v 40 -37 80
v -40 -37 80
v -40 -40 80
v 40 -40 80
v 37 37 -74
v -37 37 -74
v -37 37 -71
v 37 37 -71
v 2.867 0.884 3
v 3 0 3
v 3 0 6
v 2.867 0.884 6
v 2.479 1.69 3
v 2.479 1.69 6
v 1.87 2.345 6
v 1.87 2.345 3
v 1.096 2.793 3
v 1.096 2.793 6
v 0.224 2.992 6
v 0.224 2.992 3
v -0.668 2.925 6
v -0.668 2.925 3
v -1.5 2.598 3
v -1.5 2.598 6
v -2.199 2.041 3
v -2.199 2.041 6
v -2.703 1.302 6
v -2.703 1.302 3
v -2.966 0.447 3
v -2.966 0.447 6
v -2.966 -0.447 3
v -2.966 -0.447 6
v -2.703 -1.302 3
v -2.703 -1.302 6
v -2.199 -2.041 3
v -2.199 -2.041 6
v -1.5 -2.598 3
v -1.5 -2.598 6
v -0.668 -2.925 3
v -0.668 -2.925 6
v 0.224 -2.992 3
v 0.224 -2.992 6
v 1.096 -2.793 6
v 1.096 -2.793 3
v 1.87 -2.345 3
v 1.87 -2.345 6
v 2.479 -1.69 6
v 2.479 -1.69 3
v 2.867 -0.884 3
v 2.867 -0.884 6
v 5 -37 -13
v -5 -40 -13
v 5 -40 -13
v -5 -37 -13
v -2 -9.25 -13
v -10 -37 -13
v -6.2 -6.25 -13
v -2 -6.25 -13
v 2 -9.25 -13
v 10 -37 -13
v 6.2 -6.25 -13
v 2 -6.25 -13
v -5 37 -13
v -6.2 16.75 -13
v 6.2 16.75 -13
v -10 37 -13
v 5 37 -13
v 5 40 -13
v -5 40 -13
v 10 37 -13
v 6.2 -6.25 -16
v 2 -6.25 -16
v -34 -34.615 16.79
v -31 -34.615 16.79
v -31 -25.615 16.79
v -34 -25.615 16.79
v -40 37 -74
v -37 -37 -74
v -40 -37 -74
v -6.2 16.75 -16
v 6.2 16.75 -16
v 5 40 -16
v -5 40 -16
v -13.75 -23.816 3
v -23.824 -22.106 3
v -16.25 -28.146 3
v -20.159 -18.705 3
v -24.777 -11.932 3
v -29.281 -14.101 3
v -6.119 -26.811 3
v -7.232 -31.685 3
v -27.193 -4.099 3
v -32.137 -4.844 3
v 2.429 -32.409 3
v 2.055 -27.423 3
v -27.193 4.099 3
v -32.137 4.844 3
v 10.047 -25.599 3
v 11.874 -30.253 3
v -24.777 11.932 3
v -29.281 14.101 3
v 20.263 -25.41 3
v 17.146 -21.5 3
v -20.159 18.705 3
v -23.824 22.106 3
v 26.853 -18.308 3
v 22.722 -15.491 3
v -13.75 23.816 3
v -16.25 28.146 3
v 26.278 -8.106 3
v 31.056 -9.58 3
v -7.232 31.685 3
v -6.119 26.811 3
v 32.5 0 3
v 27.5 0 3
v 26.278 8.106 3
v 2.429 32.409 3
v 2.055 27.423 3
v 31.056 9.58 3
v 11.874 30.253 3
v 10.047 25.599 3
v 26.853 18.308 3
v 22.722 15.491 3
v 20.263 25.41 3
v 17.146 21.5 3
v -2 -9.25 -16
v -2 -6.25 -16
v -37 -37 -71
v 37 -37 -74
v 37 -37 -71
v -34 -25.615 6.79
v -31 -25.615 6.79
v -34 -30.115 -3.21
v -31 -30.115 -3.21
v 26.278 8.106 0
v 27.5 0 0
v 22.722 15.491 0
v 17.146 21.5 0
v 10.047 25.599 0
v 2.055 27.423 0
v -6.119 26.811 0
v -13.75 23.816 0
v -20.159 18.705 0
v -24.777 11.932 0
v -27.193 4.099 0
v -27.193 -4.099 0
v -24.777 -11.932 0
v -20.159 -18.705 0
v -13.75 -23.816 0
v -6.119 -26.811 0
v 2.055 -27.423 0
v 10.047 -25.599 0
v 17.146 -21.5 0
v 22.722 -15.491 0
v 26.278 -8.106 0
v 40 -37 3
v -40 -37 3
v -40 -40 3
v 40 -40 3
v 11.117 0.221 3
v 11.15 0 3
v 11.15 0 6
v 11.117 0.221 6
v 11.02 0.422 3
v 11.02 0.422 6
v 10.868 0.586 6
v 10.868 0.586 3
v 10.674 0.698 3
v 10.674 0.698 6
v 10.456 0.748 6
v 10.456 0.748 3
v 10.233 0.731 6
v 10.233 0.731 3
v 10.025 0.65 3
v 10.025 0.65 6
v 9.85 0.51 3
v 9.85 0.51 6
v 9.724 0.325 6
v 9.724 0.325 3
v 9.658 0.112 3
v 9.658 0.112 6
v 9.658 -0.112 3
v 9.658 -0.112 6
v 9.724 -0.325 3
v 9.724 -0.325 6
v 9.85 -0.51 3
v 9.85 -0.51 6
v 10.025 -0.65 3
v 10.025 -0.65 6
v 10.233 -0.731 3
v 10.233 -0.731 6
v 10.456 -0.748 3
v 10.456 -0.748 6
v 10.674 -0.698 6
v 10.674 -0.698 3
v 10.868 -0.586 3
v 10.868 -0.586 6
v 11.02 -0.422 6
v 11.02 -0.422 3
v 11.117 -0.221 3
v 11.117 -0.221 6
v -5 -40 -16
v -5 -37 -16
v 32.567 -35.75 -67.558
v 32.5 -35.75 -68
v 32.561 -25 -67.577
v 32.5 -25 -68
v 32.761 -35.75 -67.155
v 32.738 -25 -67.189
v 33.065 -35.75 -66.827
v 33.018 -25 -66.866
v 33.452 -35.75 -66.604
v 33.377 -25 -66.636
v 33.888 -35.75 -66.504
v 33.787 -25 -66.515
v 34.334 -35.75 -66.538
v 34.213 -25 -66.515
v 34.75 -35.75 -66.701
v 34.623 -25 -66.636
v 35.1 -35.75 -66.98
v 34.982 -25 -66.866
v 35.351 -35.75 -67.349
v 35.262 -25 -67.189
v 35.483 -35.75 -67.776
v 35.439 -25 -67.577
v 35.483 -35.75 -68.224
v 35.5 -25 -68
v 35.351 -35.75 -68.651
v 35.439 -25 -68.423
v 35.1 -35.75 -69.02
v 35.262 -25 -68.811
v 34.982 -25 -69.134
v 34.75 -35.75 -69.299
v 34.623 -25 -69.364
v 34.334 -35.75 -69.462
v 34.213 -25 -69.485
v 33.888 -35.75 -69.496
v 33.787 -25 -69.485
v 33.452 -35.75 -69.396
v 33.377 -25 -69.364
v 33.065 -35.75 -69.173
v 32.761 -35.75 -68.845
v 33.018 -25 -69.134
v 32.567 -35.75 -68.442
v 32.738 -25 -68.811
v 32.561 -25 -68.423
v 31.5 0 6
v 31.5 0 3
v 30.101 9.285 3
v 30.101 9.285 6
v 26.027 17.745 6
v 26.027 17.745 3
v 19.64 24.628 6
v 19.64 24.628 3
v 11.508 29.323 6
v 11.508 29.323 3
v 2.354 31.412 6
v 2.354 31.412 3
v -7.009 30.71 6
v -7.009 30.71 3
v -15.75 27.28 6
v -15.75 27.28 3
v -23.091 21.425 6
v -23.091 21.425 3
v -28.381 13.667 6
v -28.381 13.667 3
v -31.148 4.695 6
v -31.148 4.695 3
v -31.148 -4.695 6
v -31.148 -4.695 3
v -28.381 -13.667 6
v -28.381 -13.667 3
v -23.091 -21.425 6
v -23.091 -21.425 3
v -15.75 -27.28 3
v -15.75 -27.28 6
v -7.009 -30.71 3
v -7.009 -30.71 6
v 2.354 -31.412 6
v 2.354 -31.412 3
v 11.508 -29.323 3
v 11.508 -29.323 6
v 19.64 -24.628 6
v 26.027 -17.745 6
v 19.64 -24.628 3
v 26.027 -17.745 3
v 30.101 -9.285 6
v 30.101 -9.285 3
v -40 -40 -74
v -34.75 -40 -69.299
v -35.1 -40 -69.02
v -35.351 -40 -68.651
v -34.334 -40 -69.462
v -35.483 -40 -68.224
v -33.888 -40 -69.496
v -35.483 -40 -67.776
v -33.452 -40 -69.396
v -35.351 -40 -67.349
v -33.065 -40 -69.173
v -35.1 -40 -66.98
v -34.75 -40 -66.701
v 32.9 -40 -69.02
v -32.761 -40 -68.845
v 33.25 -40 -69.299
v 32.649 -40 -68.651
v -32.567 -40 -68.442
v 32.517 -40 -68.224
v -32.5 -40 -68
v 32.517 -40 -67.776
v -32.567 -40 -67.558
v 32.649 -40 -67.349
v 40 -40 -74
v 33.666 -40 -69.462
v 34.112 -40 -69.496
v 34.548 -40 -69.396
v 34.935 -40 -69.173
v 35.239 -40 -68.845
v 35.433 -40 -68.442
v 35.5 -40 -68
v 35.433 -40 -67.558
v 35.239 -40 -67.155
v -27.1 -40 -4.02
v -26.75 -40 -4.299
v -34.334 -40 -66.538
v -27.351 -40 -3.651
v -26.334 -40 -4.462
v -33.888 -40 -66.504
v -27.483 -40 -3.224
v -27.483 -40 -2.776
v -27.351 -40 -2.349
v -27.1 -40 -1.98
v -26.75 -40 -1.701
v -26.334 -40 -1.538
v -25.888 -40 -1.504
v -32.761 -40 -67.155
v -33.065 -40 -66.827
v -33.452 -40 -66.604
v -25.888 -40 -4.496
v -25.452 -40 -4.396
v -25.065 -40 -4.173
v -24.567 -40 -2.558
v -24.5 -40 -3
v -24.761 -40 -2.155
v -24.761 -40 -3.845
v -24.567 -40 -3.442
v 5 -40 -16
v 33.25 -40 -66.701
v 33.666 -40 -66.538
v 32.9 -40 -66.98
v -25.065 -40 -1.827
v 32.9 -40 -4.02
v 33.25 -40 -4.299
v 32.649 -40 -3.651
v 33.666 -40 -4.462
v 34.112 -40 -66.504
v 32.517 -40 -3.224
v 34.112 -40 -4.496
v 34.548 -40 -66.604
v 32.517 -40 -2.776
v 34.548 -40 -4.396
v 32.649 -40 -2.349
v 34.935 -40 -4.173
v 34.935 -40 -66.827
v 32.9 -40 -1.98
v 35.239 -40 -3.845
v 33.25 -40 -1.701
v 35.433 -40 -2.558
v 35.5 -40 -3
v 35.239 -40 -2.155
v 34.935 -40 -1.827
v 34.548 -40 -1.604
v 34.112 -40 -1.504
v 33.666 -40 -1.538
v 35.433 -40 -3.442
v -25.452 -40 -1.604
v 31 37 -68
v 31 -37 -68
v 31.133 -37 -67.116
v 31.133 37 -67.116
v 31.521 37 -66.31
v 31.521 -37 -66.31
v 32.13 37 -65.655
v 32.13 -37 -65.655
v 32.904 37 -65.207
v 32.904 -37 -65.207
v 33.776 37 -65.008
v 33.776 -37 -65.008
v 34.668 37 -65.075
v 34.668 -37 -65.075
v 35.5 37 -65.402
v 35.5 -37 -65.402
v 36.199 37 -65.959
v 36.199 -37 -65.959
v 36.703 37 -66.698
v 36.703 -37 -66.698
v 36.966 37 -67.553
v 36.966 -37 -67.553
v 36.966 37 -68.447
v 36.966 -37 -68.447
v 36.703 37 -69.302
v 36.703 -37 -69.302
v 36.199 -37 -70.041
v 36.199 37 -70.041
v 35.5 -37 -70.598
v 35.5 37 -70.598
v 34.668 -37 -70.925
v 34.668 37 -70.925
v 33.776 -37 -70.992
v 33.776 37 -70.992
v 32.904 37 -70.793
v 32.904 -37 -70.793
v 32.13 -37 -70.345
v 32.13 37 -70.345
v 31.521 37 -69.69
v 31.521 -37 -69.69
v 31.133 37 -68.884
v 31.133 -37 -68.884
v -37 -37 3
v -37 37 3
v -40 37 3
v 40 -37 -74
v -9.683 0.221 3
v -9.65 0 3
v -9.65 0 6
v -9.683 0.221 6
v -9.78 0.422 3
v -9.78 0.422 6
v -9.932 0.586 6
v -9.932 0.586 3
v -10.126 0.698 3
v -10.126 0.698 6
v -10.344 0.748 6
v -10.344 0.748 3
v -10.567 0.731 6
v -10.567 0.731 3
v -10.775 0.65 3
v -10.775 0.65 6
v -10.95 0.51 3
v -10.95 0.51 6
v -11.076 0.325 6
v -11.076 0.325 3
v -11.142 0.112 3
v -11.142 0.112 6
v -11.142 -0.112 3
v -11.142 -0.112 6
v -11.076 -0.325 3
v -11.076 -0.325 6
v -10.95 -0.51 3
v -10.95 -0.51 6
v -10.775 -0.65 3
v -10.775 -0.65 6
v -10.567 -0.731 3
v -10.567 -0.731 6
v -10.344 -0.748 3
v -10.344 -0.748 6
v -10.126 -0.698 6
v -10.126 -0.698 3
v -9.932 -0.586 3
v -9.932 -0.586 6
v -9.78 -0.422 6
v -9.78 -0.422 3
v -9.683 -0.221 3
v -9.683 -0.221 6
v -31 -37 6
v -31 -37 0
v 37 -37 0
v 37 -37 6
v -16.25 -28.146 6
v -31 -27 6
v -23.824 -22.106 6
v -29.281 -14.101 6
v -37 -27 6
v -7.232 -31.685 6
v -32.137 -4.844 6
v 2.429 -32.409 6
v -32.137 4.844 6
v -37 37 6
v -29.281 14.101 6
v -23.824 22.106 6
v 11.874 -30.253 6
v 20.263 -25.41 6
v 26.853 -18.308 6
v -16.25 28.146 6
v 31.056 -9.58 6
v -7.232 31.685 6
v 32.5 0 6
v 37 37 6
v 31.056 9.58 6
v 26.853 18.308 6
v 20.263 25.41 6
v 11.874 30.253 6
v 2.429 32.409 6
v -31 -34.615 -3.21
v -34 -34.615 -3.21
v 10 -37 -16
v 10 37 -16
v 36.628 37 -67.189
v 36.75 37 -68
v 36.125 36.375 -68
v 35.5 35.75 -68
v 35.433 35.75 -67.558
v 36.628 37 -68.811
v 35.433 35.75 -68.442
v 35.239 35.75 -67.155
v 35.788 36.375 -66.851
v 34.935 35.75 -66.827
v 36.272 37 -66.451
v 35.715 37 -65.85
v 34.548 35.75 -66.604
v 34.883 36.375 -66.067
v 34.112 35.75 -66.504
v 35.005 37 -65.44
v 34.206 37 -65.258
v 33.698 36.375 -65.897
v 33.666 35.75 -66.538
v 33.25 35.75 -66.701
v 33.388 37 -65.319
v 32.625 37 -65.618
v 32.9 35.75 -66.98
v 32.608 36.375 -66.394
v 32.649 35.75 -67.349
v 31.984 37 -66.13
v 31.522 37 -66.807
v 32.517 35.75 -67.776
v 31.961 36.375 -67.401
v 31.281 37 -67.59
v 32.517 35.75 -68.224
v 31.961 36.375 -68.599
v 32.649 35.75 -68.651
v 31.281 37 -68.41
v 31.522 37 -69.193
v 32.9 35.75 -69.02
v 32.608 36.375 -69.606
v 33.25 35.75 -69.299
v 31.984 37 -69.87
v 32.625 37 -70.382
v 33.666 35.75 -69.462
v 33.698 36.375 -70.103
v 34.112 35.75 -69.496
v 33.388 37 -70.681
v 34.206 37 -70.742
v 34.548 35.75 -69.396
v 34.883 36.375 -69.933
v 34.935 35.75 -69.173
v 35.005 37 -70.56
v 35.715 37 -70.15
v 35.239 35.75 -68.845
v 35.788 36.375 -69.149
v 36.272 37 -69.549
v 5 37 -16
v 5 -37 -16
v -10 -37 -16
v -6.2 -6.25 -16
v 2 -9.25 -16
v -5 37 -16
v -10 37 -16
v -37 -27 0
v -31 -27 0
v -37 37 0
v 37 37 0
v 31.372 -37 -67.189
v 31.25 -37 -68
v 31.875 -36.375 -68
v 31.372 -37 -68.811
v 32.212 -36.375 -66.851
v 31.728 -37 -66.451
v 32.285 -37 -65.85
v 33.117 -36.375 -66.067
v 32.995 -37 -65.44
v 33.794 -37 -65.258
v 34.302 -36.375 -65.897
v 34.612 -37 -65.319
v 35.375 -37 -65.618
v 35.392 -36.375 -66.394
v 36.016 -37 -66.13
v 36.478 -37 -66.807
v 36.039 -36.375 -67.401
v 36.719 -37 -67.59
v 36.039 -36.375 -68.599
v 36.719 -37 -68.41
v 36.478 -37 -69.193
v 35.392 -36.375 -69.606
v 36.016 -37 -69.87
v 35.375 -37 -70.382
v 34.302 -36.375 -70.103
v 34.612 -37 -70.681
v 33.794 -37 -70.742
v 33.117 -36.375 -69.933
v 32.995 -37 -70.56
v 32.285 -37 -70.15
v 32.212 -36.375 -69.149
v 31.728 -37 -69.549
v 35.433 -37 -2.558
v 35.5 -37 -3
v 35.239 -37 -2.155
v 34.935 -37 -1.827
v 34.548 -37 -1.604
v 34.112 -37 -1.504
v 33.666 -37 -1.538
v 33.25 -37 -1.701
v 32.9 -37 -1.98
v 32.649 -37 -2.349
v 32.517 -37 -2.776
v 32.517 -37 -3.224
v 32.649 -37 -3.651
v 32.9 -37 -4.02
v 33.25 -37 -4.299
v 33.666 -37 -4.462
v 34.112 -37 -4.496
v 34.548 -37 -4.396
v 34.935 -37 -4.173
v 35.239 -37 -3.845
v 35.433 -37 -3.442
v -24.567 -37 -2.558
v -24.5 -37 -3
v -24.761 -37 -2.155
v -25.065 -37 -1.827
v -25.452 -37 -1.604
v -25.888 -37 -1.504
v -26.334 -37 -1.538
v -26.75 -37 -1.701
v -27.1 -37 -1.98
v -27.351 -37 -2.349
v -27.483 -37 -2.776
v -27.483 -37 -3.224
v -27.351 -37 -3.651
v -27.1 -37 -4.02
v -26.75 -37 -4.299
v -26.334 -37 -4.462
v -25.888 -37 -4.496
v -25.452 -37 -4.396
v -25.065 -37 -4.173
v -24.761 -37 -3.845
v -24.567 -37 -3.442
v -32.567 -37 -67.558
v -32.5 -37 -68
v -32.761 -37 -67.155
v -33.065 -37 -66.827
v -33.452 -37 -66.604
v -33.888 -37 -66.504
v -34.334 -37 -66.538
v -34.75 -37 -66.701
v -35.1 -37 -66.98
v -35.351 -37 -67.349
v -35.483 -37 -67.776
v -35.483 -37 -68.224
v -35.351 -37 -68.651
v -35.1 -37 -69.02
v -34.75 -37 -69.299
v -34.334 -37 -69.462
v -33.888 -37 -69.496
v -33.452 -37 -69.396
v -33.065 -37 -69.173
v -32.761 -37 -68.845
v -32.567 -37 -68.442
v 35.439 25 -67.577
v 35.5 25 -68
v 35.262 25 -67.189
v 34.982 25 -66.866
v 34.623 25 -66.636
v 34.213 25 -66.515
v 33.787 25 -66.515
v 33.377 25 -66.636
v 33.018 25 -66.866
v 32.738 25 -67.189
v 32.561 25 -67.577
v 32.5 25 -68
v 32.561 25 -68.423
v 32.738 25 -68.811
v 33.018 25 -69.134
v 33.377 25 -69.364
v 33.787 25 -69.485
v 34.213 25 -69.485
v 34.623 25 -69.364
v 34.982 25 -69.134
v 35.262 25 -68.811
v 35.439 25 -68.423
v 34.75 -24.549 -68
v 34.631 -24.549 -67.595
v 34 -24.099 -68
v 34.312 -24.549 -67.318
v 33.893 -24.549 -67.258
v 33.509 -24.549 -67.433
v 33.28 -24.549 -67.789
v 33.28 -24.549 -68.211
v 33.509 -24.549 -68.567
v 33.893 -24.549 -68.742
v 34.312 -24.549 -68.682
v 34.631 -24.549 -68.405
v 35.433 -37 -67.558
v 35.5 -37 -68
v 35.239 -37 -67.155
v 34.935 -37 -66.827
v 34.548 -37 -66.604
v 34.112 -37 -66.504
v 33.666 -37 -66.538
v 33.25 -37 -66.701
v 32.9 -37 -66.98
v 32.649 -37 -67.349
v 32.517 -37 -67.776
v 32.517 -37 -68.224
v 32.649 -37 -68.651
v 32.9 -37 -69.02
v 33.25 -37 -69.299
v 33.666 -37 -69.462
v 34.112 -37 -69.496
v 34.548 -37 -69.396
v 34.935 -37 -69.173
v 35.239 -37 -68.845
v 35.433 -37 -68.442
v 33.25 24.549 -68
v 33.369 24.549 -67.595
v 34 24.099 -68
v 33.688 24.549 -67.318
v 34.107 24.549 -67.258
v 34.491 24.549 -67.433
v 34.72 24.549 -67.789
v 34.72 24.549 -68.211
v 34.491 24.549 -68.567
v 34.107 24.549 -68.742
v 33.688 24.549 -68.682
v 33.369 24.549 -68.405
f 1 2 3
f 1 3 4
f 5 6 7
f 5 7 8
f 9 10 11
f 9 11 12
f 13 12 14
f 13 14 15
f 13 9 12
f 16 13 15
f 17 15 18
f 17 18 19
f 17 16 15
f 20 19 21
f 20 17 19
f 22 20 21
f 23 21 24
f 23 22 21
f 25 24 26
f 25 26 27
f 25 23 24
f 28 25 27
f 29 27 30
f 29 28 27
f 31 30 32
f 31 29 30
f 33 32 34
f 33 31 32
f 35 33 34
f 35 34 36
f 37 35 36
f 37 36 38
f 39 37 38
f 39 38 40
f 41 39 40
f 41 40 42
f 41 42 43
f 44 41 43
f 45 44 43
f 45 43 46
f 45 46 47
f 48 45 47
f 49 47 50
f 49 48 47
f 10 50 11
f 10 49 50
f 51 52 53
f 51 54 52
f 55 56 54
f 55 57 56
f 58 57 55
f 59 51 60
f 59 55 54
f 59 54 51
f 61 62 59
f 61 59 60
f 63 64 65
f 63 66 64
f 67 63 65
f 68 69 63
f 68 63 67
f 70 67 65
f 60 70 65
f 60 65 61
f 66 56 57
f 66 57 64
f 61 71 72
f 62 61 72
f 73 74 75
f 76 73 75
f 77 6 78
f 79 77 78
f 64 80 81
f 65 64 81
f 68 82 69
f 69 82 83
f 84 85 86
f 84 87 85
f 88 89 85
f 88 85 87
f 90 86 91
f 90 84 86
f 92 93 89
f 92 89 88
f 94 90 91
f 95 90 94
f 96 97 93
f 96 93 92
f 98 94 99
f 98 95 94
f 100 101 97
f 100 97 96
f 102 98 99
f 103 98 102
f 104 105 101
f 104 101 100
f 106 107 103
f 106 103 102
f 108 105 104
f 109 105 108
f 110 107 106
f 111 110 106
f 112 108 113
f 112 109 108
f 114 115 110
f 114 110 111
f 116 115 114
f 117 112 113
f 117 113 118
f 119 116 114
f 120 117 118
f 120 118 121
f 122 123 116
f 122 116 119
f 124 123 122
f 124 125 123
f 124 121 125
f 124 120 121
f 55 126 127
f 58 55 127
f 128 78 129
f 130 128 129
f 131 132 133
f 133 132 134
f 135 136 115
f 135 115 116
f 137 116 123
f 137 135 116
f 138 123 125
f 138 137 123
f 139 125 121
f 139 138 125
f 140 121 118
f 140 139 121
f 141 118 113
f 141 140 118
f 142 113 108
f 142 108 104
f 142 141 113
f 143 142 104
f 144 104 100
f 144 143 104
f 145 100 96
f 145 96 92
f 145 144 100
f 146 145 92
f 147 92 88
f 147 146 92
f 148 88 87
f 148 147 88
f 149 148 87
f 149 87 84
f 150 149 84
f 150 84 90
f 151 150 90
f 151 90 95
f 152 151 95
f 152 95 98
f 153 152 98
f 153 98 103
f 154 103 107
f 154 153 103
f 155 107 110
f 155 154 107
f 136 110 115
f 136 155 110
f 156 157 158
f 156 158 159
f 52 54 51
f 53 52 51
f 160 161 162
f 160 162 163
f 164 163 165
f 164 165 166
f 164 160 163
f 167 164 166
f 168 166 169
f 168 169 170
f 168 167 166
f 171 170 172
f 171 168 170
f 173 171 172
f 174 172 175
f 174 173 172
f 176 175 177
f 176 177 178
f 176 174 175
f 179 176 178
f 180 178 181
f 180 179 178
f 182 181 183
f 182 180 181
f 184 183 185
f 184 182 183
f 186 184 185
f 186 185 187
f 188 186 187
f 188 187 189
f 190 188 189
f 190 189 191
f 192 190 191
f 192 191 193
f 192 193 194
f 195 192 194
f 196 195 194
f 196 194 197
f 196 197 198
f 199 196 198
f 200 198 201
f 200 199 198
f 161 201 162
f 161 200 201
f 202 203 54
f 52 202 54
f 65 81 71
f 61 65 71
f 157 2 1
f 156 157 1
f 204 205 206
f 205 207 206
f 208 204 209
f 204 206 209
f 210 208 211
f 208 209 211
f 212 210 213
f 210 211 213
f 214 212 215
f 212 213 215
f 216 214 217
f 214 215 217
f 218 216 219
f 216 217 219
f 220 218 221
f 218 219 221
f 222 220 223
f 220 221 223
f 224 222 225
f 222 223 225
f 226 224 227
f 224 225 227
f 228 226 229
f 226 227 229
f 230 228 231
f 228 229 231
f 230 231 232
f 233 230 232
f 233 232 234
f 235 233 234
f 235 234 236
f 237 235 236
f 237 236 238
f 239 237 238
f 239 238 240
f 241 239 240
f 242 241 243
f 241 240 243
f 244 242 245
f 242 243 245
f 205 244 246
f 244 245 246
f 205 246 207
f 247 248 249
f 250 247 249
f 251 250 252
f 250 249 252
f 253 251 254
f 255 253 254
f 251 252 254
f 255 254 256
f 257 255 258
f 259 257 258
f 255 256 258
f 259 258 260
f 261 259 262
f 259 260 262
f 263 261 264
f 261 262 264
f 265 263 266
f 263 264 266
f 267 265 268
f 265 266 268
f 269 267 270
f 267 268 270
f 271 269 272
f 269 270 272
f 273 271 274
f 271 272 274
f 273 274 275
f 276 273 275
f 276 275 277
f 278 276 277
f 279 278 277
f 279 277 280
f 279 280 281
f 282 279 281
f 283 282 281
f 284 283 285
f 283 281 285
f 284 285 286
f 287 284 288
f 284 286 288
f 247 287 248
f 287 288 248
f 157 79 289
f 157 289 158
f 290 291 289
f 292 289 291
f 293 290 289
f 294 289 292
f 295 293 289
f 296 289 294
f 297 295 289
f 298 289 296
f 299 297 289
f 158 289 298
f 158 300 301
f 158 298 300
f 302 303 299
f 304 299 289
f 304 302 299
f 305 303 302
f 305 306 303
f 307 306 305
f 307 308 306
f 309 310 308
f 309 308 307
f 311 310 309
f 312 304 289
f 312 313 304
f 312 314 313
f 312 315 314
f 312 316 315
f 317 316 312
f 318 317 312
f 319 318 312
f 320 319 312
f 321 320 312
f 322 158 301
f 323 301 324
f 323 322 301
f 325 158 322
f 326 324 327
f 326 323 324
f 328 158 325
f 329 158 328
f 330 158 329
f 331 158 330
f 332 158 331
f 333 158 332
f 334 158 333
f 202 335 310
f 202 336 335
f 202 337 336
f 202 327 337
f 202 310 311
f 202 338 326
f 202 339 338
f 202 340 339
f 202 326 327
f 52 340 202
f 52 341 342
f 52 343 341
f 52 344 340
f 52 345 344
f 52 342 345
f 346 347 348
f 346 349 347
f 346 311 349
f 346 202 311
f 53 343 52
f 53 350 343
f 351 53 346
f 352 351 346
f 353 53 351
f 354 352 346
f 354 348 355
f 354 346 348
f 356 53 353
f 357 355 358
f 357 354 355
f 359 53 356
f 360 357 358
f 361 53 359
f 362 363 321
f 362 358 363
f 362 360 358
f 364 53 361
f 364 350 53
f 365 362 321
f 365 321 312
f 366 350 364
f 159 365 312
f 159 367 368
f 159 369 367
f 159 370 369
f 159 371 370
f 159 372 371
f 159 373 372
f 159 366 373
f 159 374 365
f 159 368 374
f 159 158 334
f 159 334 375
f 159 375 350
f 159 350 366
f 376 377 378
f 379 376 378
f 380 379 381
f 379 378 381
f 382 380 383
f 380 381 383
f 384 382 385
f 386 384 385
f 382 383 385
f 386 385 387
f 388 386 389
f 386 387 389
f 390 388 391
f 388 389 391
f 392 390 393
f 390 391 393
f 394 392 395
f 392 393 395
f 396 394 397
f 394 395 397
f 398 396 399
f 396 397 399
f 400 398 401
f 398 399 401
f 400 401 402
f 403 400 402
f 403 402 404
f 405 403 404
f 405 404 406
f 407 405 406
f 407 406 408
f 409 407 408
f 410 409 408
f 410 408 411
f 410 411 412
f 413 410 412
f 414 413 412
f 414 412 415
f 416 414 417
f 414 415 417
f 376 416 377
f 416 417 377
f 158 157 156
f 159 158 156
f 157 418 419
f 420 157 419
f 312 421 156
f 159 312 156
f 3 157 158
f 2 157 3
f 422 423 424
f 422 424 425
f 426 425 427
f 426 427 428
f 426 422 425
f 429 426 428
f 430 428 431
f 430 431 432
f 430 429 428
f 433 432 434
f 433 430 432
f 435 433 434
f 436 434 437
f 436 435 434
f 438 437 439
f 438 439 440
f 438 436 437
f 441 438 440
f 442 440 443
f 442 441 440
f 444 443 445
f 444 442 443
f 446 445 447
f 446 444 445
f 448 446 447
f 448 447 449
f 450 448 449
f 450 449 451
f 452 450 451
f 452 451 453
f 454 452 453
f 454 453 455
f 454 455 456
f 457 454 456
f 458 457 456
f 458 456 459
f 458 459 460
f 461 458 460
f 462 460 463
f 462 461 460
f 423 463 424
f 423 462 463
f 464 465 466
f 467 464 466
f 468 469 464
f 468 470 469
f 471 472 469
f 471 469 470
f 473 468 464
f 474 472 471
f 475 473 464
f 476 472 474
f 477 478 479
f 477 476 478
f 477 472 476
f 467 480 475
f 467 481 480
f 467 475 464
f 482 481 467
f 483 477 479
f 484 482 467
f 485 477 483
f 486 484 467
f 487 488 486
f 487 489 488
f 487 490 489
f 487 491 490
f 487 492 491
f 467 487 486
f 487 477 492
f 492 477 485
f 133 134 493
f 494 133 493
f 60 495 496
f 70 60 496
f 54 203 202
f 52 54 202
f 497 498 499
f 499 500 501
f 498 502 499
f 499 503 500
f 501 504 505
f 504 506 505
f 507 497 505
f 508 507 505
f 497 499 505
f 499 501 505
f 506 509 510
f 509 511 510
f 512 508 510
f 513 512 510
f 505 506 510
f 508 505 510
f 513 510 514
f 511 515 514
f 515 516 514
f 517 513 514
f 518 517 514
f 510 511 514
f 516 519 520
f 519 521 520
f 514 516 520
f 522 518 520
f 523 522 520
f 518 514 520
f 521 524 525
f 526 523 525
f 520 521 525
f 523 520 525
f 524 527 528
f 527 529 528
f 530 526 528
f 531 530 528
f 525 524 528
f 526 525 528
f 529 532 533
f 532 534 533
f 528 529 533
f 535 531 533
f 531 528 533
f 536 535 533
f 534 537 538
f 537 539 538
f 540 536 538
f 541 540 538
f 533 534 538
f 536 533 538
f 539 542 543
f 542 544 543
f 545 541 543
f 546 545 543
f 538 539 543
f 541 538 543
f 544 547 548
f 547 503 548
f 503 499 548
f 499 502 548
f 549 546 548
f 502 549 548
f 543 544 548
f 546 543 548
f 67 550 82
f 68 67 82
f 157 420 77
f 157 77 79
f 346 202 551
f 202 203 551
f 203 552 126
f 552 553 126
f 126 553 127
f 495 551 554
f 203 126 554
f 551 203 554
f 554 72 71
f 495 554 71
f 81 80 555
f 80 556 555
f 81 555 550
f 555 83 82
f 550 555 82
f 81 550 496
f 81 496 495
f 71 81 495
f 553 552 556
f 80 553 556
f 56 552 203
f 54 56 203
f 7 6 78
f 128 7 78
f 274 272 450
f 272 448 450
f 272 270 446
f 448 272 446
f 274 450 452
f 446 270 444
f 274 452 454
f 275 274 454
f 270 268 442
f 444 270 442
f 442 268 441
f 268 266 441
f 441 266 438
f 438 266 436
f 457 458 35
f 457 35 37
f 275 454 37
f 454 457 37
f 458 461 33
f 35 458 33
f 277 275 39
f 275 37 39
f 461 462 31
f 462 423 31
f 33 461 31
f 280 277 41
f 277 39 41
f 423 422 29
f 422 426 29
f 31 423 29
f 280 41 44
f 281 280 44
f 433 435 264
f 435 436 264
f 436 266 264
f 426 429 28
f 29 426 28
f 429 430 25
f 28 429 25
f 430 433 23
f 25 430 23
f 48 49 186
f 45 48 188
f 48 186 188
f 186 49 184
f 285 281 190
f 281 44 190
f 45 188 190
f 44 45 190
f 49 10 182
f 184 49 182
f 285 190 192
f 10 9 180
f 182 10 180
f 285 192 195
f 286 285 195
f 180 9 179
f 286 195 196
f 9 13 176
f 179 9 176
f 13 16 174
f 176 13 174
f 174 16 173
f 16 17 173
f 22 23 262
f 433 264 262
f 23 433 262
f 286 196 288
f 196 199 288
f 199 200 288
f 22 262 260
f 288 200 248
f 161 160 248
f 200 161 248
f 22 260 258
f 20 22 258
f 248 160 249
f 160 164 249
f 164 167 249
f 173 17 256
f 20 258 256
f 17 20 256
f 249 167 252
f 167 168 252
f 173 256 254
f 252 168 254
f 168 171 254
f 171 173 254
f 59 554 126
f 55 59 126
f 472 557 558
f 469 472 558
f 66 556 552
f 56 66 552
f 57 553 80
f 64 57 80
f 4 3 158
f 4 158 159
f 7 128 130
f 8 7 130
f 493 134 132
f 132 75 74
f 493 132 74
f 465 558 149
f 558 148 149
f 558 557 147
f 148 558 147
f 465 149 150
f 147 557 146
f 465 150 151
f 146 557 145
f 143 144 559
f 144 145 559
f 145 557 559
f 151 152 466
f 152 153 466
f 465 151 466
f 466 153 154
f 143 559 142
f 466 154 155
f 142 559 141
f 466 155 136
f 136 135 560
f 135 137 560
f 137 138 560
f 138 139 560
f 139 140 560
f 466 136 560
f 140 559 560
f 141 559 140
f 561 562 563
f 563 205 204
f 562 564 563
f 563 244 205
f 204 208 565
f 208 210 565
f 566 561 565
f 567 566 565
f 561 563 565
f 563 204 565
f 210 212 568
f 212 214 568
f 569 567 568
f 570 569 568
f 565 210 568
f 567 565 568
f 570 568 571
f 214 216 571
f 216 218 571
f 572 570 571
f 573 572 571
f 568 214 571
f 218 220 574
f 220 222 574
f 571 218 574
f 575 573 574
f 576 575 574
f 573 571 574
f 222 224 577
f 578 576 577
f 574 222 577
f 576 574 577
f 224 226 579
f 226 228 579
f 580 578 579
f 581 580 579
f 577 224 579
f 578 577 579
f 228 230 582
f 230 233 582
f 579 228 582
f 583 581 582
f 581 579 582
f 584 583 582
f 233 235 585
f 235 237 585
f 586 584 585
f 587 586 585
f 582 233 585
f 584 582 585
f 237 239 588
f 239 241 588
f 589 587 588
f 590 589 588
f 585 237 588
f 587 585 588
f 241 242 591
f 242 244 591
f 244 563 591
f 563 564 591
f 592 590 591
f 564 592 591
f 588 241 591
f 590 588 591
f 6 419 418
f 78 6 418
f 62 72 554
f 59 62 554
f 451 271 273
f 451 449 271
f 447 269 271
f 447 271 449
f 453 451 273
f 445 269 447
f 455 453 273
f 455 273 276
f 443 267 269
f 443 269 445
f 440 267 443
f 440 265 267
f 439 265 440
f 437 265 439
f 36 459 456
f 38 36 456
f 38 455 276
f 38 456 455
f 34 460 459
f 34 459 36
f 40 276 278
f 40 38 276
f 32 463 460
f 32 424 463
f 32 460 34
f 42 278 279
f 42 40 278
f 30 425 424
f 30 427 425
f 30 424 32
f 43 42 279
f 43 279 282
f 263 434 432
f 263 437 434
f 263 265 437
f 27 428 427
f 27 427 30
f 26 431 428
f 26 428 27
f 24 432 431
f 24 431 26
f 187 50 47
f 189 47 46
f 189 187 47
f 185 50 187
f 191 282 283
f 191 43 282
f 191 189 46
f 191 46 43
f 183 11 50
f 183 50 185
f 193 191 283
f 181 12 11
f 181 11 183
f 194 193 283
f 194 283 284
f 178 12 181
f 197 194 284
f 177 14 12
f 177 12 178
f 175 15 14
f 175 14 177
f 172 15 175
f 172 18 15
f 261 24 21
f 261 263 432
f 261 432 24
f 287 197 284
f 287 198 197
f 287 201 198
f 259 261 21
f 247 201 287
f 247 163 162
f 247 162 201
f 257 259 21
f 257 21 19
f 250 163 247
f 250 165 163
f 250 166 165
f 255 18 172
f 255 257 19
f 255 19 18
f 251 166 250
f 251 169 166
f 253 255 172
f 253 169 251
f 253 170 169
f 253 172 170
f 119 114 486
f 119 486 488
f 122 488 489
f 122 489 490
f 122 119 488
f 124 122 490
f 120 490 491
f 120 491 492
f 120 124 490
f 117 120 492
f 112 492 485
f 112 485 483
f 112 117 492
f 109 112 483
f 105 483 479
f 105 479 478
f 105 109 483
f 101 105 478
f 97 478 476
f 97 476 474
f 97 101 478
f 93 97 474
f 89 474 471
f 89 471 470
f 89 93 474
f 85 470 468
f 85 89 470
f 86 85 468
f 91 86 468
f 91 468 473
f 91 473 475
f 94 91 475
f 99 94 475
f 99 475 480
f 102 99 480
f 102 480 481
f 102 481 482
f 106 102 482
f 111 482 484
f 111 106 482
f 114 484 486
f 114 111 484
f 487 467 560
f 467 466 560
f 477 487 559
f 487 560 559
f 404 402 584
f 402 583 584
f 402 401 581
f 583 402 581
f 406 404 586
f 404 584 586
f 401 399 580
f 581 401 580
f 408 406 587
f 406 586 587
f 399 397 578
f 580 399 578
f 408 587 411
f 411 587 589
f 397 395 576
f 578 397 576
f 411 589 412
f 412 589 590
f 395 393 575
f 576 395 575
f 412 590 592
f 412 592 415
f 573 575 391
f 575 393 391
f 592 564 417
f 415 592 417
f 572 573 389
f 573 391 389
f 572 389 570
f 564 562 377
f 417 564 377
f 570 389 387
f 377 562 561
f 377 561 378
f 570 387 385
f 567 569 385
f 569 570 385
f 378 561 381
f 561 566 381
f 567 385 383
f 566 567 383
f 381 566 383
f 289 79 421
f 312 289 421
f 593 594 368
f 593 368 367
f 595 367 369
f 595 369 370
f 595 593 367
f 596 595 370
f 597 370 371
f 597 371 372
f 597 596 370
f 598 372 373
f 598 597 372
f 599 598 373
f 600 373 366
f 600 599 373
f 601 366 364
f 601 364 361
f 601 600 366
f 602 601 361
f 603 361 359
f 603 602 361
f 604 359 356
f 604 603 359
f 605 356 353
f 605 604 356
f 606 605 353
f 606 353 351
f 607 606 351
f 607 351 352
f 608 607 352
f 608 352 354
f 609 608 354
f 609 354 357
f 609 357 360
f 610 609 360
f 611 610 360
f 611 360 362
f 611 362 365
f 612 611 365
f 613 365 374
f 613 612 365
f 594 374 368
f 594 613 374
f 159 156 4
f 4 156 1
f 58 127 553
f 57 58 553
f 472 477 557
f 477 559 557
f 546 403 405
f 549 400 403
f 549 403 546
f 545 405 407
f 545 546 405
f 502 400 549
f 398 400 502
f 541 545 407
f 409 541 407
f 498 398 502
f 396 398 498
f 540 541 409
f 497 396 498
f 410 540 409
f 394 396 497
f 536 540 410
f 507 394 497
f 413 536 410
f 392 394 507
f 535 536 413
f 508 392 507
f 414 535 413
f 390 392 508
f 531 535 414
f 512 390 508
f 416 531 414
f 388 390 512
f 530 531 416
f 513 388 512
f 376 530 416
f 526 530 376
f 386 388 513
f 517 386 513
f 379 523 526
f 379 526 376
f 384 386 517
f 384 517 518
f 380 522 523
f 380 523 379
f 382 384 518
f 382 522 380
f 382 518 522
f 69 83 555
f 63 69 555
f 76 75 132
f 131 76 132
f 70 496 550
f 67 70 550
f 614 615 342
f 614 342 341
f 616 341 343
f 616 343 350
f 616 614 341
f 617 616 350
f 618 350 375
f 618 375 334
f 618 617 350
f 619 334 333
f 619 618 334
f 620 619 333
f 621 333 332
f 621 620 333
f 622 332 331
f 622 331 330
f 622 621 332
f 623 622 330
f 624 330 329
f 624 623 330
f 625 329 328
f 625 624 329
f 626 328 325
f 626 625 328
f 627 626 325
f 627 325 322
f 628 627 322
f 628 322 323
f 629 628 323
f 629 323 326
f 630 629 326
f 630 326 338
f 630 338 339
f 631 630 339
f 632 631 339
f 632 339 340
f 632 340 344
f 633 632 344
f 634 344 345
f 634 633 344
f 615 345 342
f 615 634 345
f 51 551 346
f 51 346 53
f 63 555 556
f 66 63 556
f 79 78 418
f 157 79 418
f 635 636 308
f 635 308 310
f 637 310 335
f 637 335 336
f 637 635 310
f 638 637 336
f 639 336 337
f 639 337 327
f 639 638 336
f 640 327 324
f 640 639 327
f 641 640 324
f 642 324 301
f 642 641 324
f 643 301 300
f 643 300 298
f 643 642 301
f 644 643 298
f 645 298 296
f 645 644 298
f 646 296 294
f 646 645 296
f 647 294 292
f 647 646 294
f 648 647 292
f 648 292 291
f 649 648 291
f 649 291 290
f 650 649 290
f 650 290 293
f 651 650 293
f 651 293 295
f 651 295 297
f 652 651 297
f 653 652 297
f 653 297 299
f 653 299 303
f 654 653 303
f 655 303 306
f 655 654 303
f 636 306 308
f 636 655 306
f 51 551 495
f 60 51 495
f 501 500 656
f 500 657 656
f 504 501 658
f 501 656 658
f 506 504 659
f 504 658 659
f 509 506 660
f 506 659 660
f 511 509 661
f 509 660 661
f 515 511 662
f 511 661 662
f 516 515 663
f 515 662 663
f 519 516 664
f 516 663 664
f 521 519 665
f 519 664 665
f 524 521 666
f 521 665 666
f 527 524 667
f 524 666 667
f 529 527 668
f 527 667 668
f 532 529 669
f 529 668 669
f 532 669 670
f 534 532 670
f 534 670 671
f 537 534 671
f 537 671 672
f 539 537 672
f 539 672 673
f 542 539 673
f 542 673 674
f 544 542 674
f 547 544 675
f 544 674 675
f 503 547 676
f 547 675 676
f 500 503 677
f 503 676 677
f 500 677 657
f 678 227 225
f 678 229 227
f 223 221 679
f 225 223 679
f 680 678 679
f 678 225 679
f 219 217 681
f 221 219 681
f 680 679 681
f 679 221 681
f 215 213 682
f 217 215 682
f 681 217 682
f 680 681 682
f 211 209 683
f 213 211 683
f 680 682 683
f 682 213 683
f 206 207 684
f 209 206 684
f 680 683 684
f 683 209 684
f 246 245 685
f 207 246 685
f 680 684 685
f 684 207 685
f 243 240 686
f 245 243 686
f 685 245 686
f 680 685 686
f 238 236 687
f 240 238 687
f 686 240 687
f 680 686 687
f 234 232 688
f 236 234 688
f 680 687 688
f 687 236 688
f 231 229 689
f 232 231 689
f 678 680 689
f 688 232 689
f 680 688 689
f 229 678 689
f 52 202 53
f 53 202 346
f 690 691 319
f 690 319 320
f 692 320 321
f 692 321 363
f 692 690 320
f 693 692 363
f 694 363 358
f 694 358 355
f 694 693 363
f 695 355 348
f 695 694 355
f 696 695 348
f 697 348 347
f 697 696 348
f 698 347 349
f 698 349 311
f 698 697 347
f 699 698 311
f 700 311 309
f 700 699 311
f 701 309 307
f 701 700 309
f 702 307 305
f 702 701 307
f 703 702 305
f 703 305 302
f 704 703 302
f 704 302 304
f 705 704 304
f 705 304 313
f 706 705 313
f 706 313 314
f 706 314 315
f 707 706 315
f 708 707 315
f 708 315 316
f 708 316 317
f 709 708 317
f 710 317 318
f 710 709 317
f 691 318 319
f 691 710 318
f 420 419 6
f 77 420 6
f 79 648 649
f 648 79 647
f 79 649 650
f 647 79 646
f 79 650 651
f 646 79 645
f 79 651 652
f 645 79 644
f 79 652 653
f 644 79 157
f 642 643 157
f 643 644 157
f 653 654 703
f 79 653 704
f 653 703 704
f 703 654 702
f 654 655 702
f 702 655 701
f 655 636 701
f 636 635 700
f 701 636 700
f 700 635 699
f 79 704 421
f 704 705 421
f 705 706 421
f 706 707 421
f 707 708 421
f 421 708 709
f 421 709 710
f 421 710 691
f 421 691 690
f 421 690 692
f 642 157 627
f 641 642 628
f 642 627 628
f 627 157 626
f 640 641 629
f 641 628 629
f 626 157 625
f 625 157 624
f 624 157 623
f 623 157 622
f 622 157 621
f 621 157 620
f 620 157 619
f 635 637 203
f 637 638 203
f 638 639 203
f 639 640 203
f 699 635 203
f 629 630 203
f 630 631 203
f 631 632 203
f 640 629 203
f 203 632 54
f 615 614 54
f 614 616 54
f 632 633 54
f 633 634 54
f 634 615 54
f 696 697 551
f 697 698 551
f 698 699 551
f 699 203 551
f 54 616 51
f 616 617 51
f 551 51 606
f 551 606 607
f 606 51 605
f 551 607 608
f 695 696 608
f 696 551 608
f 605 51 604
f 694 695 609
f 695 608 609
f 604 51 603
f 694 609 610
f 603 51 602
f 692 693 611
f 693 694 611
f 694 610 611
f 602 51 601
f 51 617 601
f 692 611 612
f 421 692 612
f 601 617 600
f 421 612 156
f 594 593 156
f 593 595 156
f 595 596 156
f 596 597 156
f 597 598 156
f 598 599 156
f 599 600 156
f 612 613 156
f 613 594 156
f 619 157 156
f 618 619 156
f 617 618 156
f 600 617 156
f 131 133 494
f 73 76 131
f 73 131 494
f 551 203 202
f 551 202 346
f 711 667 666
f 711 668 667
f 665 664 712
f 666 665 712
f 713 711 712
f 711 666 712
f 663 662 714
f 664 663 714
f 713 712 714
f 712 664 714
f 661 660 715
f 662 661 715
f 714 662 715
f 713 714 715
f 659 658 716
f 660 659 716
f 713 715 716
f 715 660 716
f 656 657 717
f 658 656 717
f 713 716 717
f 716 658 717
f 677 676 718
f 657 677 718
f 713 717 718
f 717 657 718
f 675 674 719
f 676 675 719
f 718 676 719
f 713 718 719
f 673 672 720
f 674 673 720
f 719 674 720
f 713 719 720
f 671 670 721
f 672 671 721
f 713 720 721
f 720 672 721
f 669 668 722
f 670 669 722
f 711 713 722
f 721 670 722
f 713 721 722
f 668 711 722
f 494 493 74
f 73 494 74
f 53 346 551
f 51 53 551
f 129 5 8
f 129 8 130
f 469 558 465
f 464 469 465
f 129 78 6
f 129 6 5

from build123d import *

# Parameters (mm, degrees)
F4_R            = 27.5
F5_DEPTH        = 3
F6_R            = 32.5
F7_DEPTH        = 3
F8_R            = 31.5
F8_R_2          = 0.75
F8_R_3          = 3
F9_DEPTH        = 3
F10_W           = 64
F10_H           = 3
F11_DEPTH       = 3
F12_W           = 74
F12_H           = 74
F13_DEPTH       = 3
F14_W           = 80
F14_H           = 77
F14_R           = 1.5
F14_W_2         = 10
F14_H_2         = 3
F15_DEPTH       = 3
F16_R           = 3
F17_DEPTH       = 74
F19_D           = 3
F19_DEPTH       = 12
F19_CSINK_D     = 5.5
F19_CSINK_ANGLE = 90
F19_TIP         = 0.9012909285
F21_D           = 3
F21_DEPTH       = 12
F21_CSINK_D     = 5.5
F21_CSINK_ANGLE = 90
F21_TIP         = 0.9012909285
F23_DEPTH       = 3
F25_DEPTH       = 3
F26_W           = 80
F26_H           = 77
F27_DEPTH       = 3


with BuildPart() as f5:
    # F4 (on Top) → F5 (new body)
    with BuildSketch(Plane.XY):
        Polygon((37, -37), (37, 37), (-37, 37), (-37, -27), (-31, -27), (-31, -37), align=None)
        Circle(F4_R, mode=Mode.SUBTRACT)
    extrude(amount=F5_DEPTH)

    # F6 (on face) → F7 (join)
    with BuildSketch(Plane.XY.offset(3)):
        Polygon((-31, -37), (37, -37), (37, 37), (-37, 37), (-37, -27), (-31, -27), align=None)
        Circle(F6_R, mode=Mode.SUBTRACT)
    extrude(amount=F7_DEPTH)


with BuildPart() as f9:
    # F8 (on face) → F9 (new body)
    with BuildSketch(Plane.XY.offset(3)):
        Circle(F8_R)
        with Locations((-10.4, 0)):
            Circle(F8_R_2, mode=Mode.SUBTRACT)
        Circle(F8_R_3, mode=Mode.SUBTRACT)
        with Locations((10.4, 0)):
            Circle(F8_R_2, mode=Mode.SUBTRACT)
    extrude(amount=F9_DEPTH)


with BuildPart() as f11:
    # F10 (on face) → F11 (new body)
    with BuildSketch(Plane(origin=(-37, 0, 0), x_dir=(0, -1, 0), z_dir=(-1, 0, 0))):
        Polygon((37, 3), (27, 3), (27, 0), (-37, 0), (-37, -74), (37, -74), align=None)
        with Locations((-5, 1.5)):
            Rectangle(F10_W, F10_H)
    extrude(amount=F11_DEPTH)


with BuildPart() as f13:
    # F12 (on face) → F13 (new body)
    with BuildSketch(Plane(origin=(0, 0, -74), x_dir=(1, 0, 0), z_dir=(0, 0, -1))):
        Rectangle(F12_W, F12_H)
    extrude(amount=-F13_DEPTH)


with BuildPart() as f15:
    # F14 (on face) → F15 (new body)
    with BuildSketch(Plane.XZ.offset(37)):
        with Locations((0, -35.5)):
            Rectangle(F14_W, F14_H)
        with Locations((-34, -68)):
            Circle(F14_R, mode=Mode.SUBTRACT)
        with Locations((34, -68)):
            Circle(F14_R, mode=Mode.SUBTRACT)
        with Locations((-26, -3)):
            Circle(F14_R, mode=Mode.SUBTRACT)
        with Locations((0, -14.5)):
            Rectangle(F14_W_2, F14_H_2, mode=Mode.SUBTRACT)
        with Locations((34, -3)):
            Circle(F14_R, mode=Mode.SUBTRACT)
    extrude(amount=F15_DEPTH)


with BuildPart() as f17:
    # F16 (on face) → F17 (new body)
    with BuildSketch(Plane(origin=(0, -37, 0), x_dir=(-1, 0, 0), z_dir=(0, 1, 0))):
        with Locations((-34, -68)):
            Circle(F16_R)
    extrude(amount=F17_DEPTH)

    # F19
    with Locations(Plane(origin=(0, 37, 0), x_dir=(-1, 0, 0), z_dir=(0, 1, 0))):
        with Locations((-34, -68)):
            CounterSinkHole(F19_D / 2, F19_CSINK_D / 2, depth=F19_DEPTH, counter_sink_angle=F19_CSINK_ANGLE)
            with Locations((0, 0, -(F19_DEPTH + F19_TIP / 2))):  # 118° drill point
                Cone(0, F19_D / 2, F19_TIP, mode=Mode.SUBTRACT)

    # F21
    with Locations(Plane.XZ.offset(37)):
        with Locations((34, -68)):
            CounterSinkHole(F21_D / 2, F21_CSINK_D / 2, depth=F21_DEPTH, counter_sink_angle=F21_CSINK_ANGLE)
            with Locations((0, 0, -(F21_DEPTH + F21_TIP / 2))):  # 118° drill point
                Cone(0, F21_D / 2, F21_TIP, mode=Mode.SUBTRACT)


with BuildPart() as f23:
    # F22 (on face) → F23 (new body)
    with BuildSketch(Plane.XY.offset(-16)):
        Polygon((-5, -40), (5, -40), (5, -37), (10, -37), (10, 37), (5, 37), (5, 40), (-5, 40), (-5, 37), (-10, 37), (-10, -37), (-5, -37), align=None)
        Polygon((-6.2, 16.75), (6.2, 16.75), (6.2, -6.25), (2, -6.25), (2, -9.25), (-2, -9.25), (-2, -6.25), (-6.2, -6.25), align=None, mode=Mode.SUBTRACT)
    extrude(amount=F23_DEPTH)


with BuildPart() as f25:
    # F24 (on face) → F25 (new body)
    with BuildSketch(Plane(origin=(-31, 0, 0), x_dir=(0, -1, 0), z_dir=(-1, 0, 0))):
        Polygon((34.6148688495, 16.7903841846), (25.6148688495, 16.7903841846), (25.6148688495, 6.7903841846), (30.1148688495, -3.2096158154), (34.6148688495, -3.2096158154), align=None)
    extrude(amount=F25_DEPTH)


with BuildPart() as f27:
    # F26 (on face) → F27 (new body)
    with BuildSketch(Plane.XZ.offset(37)):
        with Locations((0, 41.5)):
            Rectangle(F26_W, F26_H)
    extrude(amount=F27_DEPTH)


solid = Compound([f5.part, f9.part, f11.part, f13.part, f15.part, f17.part, f23.part, f25.part, f27.part])
